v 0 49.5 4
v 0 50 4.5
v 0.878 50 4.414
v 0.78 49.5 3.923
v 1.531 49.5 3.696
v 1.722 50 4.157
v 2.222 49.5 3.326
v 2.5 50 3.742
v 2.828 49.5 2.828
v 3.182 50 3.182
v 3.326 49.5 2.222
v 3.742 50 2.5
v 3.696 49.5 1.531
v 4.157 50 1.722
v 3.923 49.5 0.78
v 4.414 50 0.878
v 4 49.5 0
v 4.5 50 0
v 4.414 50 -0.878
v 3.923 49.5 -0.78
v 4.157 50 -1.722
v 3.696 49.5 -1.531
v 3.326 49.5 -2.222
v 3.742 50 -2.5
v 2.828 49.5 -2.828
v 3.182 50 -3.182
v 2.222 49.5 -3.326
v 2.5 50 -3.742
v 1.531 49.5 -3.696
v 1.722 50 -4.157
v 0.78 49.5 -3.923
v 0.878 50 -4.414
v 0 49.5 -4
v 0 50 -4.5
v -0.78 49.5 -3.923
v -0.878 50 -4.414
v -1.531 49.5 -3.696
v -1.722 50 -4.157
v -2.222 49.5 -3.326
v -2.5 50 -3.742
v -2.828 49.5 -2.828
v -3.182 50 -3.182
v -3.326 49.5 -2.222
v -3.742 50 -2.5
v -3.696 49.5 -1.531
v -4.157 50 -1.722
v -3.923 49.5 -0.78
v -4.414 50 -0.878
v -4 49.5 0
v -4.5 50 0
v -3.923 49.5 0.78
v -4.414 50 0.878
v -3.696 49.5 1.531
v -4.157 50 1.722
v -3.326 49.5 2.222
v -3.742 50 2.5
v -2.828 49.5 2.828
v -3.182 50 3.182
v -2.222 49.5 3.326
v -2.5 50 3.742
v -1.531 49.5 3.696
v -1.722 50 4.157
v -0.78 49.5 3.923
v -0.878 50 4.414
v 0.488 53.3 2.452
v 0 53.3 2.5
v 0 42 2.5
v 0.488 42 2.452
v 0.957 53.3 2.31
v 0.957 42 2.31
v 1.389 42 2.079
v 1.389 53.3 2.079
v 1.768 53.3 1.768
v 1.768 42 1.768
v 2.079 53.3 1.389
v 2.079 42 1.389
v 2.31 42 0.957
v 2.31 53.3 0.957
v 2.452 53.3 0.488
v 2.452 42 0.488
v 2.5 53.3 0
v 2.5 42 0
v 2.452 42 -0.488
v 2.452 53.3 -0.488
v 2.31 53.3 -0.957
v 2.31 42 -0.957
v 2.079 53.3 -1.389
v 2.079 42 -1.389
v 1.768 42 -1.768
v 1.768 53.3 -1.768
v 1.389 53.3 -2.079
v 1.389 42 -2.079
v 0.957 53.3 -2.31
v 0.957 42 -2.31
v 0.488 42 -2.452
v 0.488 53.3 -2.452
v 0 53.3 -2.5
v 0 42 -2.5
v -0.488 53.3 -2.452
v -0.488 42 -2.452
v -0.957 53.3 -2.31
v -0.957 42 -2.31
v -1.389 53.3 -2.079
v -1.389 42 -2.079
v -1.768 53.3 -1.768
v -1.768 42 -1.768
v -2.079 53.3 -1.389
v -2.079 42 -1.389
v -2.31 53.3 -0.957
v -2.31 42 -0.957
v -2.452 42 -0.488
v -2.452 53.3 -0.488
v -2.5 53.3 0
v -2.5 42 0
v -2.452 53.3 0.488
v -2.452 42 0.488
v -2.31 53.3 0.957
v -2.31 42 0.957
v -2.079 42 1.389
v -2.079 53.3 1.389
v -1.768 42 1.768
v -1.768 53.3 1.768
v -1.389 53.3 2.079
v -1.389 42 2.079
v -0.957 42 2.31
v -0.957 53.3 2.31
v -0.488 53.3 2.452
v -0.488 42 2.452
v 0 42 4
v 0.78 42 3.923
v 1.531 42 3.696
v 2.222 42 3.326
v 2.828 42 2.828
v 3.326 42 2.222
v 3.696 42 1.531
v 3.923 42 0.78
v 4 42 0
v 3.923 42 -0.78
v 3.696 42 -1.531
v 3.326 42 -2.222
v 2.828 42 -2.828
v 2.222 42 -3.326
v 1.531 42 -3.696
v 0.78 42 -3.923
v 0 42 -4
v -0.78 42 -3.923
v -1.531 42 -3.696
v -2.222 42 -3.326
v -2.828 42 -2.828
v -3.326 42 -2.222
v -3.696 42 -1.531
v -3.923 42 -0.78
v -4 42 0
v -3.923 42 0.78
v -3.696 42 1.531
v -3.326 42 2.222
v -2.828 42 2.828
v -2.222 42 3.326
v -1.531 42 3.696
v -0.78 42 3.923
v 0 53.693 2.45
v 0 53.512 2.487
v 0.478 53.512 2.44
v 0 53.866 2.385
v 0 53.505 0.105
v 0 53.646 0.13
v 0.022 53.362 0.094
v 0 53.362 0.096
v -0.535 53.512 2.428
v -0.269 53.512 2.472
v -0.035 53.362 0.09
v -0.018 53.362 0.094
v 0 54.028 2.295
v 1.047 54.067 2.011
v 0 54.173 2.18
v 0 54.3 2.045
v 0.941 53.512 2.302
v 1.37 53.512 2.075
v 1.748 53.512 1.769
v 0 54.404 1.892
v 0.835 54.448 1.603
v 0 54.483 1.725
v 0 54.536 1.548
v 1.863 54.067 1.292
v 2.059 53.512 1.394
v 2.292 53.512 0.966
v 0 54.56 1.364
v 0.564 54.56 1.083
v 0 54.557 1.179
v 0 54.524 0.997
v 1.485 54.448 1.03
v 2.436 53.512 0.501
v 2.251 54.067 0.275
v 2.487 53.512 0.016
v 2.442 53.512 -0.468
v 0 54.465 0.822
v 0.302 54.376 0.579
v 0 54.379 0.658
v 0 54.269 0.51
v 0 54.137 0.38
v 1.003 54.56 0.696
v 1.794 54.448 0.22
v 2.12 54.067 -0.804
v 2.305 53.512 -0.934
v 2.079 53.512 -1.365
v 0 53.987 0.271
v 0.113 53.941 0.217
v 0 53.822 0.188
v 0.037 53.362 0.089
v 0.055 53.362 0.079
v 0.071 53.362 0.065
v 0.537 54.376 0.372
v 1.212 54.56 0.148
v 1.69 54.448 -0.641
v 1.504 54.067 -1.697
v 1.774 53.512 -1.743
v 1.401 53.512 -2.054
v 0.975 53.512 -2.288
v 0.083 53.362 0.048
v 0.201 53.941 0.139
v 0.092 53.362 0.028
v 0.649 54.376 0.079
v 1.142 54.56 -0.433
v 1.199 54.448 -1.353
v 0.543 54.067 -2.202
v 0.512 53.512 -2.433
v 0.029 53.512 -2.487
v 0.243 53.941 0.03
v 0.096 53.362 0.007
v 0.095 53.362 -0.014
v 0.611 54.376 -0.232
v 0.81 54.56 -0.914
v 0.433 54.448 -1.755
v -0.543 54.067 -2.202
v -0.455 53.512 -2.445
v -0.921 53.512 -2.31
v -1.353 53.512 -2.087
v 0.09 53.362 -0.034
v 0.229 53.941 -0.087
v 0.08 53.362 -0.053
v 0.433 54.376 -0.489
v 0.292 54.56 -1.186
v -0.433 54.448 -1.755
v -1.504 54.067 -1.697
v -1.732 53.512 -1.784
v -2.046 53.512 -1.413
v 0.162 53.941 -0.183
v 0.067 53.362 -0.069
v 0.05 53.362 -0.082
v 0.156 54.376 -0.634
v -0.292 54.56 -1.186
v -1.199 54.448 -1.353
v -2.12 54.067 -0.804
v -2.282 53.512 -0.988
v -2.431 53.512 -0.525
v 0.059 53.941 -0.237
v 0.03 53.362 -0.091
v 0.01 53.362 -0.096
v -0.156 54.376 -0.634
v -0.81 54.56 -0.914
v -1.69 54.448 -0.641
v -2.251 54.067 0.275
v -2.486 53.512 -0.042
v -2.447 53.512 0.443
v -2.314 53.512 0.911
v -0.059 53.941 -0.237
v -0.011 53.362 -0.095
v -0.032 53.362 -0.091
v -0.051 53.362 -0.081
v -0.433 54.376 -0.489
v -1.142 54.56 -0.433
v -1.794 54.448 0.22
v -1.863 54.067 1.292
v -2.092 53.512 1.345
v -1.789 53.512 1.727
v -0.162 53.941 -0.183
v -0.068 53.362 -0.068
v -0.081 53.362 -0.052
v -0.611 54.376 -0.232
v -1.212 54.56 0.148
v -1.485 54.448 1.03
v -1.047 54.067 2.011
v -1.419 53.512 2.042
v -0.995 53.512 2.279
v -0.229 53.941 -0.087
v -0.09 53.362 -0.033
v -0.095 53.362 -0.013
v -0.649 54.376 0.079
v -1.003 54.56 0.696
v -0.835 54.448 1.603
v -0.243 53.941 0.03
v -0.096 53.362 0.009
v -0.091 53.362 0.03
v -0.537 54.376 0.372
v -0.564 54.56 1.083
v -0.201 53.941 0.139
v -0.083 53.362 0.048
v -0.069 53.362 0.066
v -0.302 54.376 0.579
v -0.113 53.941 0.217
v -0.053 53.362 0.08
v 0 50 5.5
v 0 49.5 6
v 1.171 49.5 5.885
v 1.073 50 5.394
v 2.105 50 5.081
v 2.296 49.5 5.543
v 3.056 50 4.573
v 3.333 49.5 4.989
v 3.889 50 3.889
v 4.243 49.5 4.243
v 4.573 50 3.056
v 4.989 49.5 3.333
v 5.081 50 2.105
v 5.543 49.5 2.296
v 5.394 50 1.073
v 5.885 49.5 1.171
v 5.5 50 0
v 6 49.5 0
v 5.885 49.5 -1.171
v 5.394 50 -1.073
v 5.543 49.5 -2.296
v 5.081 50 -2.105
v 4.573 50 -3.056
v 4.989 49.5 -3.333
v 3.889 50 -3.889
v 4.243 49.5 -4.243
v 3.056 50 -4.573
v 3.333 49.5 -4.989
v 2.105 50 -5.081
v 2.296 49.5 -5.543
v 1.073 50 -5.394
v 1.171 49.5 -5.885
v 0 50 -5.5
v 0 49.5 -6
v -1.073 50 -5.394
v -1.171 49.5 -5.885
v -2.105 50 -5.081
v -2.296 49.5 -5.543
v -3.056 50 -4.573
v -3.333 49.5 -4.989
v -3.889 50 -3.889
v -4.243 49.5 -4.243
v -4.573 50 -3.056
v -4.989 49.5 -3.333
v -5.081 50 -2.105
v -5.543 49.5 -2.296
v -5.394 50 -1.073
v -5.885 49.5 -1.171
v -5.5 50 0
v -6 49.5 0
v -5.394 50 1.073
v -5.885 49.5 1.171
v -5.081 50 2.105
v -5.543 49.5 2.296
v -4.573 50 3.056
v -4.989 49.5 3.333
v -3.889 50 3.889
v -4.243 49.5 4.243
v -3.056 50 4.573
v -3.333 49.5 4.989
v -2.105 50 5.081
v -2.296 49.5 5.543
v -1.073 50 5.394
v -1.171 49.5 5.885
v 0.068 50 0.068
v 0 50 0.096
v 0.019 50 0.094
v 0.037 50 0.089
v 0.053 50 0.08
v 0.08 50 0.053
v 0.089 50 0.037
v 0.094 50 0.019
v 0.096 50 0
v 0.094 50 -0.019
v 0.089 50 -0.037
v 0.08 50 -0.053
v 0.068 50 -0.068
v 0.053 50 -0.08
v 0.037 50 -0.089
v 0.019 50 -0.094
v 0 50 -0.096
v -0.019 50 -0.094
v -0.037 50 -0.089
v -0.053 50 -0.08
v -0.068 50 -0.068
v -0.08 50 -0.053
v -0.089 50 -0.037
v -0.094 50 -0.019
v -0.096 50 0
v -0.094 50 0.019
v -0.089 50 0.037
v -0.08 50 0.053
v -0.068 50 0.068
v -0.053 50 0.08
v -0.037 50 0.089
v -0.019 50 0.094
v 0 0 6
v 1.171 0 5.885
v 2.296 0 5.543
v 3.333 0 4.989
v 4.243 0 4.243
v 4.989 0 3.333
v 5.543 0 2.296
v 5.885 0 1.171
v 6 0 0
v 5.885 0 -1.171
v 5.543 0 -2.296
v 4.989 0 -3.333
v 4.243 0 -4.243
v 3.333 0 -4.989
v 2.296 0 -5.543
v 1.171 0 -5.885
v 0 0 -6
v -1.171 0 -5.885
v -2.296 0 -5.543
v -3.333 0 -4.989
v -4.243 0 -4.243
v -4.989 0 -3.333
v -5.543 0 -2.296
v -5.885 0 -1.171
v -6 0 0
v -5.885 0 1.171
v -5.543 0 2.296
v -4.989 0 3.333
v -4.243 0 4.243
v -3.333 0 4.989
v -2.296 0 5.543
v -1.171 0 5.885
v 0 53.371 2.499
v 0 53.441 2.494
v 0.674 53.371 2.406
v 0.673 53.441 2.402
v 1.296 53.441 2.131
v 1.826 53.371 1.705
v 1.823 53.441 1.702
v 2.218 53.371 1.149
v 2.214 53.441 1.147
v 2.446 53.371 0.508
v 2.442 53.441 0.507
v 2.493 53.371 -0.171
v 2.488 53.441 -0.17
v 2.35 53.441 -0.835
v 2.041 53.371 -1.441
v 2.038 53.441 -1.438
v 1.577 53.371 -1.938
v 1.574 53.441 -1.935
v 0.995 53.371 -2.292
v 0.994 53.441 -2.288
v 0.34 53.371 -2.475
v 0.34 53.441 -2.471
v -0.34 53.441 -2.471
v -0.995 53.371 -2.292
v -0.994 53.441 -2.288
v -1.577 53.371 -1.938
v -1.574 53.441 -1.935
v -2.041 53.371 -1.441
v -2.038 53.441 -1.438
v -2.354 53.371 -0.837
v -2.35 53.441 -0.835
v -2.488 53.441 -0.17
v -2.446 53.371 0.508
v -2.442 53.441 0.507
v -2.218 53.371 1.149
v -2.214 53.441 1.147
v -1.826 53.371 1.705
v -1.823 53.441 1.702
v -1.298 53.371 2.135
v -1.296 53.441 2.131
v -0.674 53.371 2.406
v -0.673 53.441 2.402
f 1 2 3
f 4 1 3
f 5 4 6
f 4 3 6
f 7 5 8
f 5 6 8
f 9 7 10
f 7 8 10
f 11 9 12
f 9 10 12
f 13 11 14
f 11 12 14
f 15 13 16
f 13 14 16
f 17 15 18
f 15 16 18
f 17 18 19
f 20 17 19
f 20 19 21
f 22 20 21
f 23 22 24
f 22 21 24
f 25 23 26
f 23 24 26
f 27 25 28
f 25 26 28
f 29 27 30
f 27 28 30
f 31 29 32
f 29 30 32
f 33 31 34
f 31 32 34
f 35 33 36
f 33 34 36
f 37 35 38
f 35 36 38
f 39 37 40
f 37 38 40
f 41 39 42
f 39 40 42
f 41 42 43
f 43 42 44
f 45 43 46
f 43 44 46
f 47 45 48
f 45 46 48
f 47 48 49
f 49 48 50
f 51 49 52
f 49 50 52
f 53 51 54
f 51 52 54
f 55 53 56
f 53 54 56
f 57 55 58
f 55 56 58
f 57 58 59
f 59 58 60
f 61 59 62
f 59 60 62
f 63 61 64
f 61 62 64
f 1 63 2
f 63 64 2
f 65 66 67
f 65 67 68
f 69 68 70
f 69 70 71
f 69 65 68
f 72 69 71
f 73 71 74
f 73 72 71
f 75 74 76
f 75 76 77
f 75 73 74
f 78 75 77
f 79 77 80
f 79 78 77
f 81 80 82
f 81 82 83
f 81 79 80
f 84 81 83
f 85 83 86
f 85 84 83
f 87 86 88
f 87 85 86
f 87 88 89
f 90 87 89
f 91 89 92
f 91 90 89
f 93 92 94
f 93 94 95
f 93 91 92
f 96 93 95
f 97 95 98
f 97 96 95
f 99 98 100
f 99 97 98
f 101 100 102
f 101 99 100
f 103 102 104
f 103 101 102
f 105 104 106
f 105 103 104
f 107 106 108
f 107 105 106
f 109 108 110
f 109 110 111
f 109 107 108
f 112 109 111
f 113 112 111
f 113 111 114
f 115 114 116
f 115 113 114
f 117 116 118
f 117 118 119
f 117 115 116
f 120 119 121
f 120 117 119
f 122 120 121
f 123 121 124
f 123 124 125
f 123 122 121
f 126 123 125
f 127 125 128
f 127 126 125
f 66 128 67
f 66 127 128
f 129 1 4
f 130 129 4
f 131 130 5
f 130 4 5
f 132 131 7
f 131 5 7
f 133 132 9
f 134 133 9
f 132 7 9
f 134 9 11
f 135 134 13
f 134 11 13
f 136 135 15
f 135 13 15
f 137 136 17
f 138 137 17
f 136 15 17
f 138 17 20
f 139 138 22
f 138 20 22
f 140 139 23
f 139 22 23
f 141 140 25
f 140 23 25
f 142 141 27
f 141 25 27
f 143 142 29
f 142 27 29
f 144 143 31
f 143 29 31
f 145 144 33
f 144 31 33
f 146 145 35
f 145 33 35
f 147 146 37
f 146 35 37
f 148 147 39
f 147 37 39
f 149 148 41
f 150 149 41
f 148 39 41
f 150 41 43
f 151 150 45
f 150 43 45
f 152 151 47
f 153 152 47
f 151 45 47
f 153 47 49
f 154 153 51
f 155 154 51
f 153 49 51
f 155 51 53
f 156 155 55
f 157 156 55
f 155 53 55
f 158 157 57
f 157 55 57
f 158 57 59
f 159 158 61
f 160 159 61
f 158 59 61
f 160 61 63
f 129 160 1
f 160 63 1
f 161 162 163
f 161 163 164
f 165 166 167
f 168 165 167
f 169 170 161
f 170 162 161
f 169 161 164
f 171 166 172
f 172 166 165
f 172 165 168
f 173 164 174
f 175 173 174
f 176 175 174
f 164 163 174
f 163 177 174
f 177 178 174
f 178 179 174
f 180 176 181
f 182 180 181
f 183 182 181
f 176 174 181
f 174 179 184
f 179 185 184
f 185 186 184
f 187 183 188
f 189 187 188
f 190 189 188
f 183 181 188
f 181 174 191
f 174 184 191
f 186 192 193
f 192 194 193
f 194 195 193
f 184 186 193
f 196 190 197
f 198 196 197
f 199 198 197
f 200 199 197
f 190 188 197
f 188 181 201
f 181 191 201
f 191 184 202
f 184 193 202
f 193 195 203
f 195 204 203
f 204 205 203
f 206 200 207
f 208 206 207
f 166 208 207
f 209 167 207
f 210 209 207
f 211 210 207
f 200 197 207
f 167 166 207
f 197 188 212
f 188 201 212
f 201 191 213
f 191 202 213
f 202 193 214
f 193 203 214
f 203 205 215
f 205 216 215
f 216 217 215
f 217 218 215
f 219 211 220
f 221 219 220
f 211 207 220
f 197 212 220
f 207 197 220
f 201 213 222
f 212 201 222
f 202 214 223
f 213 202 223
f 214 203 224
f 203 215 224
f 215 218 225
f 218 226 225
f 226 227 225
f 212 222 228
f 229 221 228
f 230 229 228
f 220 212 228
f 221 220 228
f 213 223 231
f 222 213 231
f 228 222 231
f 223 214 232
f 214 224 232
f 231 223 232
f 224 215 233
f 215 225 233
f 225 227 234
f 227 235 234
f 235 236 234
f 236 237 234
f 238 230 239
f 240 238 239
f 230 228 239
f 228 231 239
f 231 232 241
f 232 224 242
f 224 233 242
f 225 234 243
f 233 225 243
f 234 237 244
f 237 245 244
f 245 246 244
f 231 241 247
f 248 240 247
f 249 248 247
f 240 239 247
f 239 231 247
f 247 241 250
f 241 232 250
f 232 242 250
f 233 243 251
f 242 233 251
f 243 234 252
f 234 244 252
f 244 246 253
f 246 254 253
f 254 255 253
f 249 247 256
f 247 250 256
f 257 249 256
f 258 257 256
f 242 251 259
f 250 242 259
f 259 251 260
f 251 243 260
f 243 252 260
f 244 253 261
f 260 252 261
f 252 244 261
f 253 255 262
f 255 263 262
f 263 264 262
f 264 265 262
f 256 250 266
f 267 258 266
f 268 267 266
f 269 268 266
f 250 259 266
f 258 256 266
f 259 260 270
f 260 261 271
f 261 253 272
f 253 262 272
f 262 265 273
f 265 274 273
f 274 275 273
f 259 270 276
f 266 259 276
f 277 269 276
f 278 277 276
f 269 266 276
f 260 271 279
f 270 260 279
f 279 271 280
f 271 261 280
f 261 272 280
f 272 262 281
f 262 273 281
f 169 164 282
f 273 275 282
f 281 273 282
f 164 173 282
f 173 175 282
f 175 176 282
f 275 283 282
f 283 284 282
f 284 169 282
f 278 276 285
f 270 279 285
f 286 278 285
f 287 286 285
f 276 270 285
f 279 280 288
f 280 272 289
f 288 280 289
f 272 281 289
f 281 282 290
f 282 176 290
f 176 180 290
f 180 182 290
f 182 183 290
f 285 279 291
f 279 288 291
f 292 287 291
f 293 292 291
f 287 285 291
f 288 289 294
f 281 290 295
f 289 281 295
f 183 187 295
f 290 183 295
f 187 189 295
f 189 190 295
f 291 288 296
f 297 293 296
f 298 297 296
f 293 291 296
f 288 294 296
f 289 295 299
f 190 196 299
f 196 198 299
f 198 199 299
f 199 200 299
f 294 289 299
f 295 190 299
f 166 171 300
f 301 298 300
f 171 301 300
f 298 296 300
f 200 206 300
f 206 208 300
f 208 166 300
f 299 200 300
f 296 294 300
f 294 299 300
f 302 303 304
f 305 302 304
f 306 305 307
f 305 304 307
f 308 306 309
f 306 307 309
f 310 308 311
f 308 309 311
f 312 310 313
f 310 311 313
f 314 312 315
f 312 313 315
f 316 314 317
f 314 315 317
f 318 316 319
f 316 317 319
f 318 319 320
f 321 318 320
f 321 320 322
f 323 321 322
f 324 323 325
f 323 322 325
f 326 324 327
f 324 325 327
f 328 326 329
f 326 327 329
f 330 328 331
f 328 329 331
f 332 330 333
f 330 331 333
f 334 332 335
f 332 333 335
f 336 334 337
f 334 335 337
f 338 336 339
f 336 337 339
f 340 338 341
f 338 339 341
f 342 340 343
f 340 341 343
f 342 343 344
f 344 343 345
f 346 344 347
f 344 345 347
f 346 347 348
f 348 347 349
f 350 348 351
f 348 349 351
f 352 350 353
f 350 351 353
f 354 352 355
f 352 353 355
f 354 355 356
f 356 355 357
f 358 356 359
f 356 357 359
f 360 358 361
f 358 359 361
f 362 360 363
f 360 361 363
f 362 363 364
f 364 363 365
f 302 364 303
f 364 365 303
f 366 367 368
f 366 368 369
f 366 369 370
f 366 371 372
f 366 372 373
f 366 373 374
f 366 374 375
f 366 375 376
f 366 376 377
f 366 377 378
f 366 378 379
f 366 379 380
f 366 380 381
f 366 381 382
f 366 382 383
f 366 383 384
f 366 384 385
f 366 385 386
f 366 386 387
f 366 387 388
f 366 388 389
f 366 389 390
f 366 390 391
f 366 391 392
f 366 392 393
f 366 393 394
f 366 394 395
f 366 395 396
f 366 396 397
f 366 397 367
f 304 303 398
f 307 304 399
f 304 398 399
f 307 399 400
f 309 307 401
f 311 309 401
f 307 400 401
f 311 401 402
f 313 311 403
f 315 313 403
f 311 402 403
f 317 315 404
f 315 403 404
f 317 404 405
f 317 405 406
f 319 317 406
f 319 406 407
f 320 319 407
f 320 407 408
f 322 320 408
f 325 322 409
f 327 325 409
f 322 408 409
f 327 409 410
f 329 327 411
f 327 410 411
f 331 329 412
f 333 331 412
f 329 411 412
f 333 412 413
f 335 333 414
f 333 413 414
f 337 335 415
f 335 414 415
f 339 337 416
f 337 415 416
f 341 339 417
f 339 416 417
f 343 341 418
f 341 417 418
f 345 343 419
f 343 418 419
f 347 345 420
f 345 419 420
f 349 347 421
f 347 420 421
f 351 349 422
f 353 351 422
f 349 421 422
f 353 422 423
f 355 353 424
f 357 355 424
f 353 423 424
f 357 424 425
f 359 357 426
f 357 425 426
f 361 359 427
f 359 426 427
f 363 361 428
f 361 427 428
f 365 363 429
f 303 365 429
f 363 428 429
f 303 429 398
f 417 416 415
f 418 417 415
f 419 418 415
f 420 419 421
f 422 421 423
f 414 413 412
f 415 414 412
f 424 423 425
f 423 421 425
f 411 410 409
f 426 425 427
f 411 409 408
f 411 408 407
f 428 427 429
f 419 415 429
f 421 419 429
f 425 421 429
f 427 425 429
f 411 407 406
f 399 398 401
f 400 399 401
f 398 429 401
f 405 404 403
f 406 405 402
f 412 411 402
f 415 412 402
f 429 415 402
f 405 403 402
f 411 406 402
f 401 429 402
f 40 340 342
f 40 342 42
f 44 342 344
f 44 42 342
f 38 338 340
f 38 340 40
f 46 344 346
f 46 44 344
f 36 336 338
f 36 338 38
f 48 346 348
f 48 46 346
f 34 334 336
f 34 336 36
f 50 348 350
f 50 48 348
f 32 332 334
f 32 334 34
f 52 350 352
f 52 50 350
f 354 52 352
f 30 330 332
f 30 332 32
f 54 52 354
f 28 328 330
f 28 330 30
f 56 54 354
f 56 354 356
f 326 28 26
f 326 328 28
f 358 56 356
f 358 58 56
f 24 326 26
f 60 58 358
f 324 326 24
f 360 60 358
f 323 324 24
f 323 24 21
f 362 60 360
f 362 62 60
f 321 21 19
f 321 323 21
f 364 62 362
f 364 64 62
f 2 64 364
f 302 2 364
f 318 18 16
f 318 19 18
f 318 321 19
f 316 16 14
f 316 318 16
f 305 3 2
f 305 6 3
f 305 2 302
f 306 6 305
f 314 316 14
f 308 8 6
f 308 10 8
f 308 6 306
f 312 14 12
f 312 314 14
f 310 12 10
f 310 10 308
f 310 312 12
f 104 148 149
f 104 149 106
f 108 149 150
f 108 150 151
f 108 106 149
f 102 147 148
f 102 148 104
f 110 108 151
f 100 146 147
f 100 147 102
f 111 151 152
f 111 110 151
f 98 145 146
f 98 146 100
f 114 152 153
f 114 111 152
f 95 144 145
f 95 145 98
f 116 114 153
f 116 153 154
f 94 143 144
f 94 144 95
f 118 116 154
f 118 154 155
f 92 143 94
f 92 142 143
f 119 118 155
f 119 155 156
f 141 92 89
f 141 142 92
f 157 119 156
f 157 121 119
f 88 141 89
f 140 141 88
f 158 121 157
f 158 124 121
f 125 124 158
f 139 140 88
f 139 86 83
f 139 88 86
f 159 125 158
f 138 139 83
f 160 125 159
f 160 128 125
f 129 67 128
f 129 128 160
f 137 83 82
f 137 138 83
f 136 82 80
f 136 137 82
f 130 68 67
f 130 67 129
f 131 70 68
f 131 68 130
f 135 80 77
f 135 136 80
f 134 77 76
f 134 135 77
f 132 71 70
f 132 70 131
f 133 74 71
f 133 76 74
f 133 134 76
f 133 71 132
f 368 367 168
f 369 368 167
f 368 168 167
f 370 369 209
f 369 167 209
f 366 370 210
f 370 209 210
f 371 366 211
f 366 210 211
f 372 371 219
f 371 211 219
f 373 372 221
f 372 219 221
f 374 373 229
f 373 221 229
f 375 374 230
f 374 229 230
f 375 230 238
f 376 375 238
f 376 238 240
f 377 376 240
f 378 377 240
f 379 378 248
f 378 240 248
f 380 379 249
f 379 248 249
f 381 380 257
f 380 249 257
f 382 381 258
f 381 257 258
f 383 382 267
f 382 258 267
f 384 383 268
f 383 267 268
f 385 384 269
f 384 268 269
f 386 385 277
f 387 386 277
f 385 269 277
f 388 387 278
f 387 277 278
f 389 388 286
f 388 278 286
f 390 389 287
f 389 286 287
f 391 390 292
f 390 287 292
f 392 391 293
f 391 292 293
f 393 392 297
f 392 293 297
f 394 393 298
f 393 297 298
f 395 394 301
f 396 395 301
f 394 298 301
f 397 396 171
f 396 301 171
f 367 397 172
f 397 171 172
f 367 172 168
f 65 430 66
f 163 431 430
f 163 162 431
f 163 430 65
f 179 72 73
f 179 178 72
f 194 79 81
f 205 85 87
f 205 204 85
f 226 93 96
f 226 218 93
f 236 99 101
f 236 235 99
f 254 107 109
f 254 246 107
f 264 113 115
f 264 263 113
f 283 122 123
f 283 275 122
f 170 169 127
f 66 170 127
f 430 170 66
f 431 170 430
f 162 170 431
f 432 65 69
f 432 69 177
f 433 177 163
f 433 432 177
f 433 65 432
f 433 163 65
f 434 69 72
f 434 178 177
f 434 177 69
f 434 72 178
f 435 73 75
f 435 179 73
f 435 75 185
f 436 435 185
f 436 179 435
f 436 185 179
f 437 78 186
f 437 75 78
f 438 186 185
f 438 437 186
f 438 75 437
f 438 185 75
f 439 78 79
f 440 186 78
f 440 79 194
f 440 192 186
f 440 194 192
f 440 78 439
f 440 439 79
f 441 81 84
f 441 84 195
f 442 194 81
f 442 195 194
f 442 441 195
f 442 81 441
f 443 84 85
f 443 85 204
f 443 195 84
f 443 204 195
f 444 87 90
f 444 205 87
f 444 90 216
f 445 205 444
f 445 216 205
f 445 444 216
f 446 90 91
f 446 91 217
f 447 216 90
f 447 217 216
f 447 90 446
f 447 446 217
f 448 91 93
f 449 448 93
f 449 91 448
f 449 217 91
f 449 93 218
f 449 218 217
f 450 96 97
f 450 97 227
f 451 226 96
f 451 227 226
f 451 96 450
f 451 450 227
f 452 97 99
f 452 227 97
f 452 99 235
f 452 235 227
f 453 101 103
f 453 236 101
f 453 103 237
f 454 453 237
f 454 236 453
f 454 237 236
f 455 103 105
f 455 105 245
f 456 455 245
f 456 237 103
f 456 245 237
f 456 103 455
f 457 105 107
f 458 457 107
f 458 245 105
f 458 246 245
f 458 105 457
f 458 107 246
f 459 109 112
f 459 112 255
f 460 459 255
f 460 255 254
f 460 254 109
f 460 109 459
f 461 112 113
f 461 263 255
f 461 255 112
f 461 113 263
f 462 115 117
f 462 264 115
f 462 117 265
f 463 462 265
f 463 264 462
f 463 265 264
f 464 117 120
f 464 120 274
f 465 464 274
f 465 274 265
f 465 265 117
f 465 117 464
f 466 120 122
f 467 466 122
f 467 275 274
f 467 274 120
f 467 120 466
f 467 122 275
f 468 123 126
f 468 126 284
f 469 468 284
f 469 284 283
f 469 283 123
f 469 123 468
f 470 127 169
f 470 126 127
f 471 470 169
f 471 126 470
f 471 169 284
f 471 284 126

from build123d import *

# Parameters (mm, degrees)
SKETCH_1_R          = 6
EXTRUDE_1_DEPTH     = 50
SKETCH_2_R          = 4
SKETCH_2_R_2        = 2.5
CUT_EXTRUDE_1_DEPTH = 8
EXTRUDE_START       = 5
SKETCH_3_R          = 2.5
EXTRUDE_2_DEPTH     = 5
FILLET_1_R          = 1.7
SKETCH_4_R          = 0.096106959
CUT_EXTRUDE_2_DEPTH = 5
FILLET_2_R          = 1.2
CHAMFER_1_SIZE      = 0.5


with BuildPart() as part:
    # 草图1 → 凸台-拉伸1 (new body)
    with BuildSketch(Plane(origin=(0, 0, 0), x_dir=(1, 0, 0), z_dir=(0, 1, 0))):
        with Locations(Location((0, 0, 0), (0, 0, 270))):
            Circle(SKETCH_1_R)
    extrude(amount=EXTRUDE_1_DEPTH)

    # 草图2 → 切除-拉伸1 (cut)
    with BuildSketch(Plane(origin=(0, 50, 0), x_dir=(1, 0, 0), z_dir=(0, 1, 0))):
        with Locations(Location((0, 0, 0), (0, 0, 270))):
            Circle(SKETCH_2_R)
        with Locations(Location((0, 0, 0), (0, 0, 270))):
            Circle(SKETCH_2_R_2, mode=Mode.SUBTRACT)
    extrude(amount=-CUT_EXTRUDE_1_DEPTH, mode=Mode.SUBTRACT)

    # 草图3 → 凸台-拉伸2 (add)
    with BuildSketch(Plane(origin=(0, 50, 0), x_dir=(1, 0, 0), z_dir=(0, 1, 0)).offset(EXTRUDE_START)):
        with Locations(Location((0, 0, 0), (0, 0, 270))):
            Circle(SKETCH_3_R)
    extrude(amount=-EXTRUDE_2_DEPTH)

    # 圆角1
    fillet_1_edges = [part.edges().sort_by_distance(p)[0] for p in [
        (0, 55, -2.5),
    ]]
    fillet(fillet_1_edges, radius=FILLET_1_R)

    # 草图4 → 切除-拉伸2 (cut)
    with BuildSketch(Plane(origin=(0, 55, 0), x_dir=(1, 0, 0), z_dir=(0, 1, 0))):
        with Locations(Location((0, 0, 0), (0, 0, 270))):
            Circle(SKETCH_4_R)
    extrude(amount=-CUT_EXTRUDE_2_DEPTH, mode=Mode.SUBTRACT)

    # 圆角2
    fillet_2_edges = [part.edges().sort_by_distance(p)[0] for p in [
        (0, 55, -0.096106959),
    ]]
    fillet(fillet_2_edges, radius=FILLET_2_R)

    # 倒角1
    chamfer_1_edges = [part.edges().sort_by_distance(p)[0] for p in [
        (0, 50, -6),
        (0, 50, -4),
    ]]
    chamfer(chamfer_1_edges, length=CHAMFER_1_SIZE)


solid = part.part
